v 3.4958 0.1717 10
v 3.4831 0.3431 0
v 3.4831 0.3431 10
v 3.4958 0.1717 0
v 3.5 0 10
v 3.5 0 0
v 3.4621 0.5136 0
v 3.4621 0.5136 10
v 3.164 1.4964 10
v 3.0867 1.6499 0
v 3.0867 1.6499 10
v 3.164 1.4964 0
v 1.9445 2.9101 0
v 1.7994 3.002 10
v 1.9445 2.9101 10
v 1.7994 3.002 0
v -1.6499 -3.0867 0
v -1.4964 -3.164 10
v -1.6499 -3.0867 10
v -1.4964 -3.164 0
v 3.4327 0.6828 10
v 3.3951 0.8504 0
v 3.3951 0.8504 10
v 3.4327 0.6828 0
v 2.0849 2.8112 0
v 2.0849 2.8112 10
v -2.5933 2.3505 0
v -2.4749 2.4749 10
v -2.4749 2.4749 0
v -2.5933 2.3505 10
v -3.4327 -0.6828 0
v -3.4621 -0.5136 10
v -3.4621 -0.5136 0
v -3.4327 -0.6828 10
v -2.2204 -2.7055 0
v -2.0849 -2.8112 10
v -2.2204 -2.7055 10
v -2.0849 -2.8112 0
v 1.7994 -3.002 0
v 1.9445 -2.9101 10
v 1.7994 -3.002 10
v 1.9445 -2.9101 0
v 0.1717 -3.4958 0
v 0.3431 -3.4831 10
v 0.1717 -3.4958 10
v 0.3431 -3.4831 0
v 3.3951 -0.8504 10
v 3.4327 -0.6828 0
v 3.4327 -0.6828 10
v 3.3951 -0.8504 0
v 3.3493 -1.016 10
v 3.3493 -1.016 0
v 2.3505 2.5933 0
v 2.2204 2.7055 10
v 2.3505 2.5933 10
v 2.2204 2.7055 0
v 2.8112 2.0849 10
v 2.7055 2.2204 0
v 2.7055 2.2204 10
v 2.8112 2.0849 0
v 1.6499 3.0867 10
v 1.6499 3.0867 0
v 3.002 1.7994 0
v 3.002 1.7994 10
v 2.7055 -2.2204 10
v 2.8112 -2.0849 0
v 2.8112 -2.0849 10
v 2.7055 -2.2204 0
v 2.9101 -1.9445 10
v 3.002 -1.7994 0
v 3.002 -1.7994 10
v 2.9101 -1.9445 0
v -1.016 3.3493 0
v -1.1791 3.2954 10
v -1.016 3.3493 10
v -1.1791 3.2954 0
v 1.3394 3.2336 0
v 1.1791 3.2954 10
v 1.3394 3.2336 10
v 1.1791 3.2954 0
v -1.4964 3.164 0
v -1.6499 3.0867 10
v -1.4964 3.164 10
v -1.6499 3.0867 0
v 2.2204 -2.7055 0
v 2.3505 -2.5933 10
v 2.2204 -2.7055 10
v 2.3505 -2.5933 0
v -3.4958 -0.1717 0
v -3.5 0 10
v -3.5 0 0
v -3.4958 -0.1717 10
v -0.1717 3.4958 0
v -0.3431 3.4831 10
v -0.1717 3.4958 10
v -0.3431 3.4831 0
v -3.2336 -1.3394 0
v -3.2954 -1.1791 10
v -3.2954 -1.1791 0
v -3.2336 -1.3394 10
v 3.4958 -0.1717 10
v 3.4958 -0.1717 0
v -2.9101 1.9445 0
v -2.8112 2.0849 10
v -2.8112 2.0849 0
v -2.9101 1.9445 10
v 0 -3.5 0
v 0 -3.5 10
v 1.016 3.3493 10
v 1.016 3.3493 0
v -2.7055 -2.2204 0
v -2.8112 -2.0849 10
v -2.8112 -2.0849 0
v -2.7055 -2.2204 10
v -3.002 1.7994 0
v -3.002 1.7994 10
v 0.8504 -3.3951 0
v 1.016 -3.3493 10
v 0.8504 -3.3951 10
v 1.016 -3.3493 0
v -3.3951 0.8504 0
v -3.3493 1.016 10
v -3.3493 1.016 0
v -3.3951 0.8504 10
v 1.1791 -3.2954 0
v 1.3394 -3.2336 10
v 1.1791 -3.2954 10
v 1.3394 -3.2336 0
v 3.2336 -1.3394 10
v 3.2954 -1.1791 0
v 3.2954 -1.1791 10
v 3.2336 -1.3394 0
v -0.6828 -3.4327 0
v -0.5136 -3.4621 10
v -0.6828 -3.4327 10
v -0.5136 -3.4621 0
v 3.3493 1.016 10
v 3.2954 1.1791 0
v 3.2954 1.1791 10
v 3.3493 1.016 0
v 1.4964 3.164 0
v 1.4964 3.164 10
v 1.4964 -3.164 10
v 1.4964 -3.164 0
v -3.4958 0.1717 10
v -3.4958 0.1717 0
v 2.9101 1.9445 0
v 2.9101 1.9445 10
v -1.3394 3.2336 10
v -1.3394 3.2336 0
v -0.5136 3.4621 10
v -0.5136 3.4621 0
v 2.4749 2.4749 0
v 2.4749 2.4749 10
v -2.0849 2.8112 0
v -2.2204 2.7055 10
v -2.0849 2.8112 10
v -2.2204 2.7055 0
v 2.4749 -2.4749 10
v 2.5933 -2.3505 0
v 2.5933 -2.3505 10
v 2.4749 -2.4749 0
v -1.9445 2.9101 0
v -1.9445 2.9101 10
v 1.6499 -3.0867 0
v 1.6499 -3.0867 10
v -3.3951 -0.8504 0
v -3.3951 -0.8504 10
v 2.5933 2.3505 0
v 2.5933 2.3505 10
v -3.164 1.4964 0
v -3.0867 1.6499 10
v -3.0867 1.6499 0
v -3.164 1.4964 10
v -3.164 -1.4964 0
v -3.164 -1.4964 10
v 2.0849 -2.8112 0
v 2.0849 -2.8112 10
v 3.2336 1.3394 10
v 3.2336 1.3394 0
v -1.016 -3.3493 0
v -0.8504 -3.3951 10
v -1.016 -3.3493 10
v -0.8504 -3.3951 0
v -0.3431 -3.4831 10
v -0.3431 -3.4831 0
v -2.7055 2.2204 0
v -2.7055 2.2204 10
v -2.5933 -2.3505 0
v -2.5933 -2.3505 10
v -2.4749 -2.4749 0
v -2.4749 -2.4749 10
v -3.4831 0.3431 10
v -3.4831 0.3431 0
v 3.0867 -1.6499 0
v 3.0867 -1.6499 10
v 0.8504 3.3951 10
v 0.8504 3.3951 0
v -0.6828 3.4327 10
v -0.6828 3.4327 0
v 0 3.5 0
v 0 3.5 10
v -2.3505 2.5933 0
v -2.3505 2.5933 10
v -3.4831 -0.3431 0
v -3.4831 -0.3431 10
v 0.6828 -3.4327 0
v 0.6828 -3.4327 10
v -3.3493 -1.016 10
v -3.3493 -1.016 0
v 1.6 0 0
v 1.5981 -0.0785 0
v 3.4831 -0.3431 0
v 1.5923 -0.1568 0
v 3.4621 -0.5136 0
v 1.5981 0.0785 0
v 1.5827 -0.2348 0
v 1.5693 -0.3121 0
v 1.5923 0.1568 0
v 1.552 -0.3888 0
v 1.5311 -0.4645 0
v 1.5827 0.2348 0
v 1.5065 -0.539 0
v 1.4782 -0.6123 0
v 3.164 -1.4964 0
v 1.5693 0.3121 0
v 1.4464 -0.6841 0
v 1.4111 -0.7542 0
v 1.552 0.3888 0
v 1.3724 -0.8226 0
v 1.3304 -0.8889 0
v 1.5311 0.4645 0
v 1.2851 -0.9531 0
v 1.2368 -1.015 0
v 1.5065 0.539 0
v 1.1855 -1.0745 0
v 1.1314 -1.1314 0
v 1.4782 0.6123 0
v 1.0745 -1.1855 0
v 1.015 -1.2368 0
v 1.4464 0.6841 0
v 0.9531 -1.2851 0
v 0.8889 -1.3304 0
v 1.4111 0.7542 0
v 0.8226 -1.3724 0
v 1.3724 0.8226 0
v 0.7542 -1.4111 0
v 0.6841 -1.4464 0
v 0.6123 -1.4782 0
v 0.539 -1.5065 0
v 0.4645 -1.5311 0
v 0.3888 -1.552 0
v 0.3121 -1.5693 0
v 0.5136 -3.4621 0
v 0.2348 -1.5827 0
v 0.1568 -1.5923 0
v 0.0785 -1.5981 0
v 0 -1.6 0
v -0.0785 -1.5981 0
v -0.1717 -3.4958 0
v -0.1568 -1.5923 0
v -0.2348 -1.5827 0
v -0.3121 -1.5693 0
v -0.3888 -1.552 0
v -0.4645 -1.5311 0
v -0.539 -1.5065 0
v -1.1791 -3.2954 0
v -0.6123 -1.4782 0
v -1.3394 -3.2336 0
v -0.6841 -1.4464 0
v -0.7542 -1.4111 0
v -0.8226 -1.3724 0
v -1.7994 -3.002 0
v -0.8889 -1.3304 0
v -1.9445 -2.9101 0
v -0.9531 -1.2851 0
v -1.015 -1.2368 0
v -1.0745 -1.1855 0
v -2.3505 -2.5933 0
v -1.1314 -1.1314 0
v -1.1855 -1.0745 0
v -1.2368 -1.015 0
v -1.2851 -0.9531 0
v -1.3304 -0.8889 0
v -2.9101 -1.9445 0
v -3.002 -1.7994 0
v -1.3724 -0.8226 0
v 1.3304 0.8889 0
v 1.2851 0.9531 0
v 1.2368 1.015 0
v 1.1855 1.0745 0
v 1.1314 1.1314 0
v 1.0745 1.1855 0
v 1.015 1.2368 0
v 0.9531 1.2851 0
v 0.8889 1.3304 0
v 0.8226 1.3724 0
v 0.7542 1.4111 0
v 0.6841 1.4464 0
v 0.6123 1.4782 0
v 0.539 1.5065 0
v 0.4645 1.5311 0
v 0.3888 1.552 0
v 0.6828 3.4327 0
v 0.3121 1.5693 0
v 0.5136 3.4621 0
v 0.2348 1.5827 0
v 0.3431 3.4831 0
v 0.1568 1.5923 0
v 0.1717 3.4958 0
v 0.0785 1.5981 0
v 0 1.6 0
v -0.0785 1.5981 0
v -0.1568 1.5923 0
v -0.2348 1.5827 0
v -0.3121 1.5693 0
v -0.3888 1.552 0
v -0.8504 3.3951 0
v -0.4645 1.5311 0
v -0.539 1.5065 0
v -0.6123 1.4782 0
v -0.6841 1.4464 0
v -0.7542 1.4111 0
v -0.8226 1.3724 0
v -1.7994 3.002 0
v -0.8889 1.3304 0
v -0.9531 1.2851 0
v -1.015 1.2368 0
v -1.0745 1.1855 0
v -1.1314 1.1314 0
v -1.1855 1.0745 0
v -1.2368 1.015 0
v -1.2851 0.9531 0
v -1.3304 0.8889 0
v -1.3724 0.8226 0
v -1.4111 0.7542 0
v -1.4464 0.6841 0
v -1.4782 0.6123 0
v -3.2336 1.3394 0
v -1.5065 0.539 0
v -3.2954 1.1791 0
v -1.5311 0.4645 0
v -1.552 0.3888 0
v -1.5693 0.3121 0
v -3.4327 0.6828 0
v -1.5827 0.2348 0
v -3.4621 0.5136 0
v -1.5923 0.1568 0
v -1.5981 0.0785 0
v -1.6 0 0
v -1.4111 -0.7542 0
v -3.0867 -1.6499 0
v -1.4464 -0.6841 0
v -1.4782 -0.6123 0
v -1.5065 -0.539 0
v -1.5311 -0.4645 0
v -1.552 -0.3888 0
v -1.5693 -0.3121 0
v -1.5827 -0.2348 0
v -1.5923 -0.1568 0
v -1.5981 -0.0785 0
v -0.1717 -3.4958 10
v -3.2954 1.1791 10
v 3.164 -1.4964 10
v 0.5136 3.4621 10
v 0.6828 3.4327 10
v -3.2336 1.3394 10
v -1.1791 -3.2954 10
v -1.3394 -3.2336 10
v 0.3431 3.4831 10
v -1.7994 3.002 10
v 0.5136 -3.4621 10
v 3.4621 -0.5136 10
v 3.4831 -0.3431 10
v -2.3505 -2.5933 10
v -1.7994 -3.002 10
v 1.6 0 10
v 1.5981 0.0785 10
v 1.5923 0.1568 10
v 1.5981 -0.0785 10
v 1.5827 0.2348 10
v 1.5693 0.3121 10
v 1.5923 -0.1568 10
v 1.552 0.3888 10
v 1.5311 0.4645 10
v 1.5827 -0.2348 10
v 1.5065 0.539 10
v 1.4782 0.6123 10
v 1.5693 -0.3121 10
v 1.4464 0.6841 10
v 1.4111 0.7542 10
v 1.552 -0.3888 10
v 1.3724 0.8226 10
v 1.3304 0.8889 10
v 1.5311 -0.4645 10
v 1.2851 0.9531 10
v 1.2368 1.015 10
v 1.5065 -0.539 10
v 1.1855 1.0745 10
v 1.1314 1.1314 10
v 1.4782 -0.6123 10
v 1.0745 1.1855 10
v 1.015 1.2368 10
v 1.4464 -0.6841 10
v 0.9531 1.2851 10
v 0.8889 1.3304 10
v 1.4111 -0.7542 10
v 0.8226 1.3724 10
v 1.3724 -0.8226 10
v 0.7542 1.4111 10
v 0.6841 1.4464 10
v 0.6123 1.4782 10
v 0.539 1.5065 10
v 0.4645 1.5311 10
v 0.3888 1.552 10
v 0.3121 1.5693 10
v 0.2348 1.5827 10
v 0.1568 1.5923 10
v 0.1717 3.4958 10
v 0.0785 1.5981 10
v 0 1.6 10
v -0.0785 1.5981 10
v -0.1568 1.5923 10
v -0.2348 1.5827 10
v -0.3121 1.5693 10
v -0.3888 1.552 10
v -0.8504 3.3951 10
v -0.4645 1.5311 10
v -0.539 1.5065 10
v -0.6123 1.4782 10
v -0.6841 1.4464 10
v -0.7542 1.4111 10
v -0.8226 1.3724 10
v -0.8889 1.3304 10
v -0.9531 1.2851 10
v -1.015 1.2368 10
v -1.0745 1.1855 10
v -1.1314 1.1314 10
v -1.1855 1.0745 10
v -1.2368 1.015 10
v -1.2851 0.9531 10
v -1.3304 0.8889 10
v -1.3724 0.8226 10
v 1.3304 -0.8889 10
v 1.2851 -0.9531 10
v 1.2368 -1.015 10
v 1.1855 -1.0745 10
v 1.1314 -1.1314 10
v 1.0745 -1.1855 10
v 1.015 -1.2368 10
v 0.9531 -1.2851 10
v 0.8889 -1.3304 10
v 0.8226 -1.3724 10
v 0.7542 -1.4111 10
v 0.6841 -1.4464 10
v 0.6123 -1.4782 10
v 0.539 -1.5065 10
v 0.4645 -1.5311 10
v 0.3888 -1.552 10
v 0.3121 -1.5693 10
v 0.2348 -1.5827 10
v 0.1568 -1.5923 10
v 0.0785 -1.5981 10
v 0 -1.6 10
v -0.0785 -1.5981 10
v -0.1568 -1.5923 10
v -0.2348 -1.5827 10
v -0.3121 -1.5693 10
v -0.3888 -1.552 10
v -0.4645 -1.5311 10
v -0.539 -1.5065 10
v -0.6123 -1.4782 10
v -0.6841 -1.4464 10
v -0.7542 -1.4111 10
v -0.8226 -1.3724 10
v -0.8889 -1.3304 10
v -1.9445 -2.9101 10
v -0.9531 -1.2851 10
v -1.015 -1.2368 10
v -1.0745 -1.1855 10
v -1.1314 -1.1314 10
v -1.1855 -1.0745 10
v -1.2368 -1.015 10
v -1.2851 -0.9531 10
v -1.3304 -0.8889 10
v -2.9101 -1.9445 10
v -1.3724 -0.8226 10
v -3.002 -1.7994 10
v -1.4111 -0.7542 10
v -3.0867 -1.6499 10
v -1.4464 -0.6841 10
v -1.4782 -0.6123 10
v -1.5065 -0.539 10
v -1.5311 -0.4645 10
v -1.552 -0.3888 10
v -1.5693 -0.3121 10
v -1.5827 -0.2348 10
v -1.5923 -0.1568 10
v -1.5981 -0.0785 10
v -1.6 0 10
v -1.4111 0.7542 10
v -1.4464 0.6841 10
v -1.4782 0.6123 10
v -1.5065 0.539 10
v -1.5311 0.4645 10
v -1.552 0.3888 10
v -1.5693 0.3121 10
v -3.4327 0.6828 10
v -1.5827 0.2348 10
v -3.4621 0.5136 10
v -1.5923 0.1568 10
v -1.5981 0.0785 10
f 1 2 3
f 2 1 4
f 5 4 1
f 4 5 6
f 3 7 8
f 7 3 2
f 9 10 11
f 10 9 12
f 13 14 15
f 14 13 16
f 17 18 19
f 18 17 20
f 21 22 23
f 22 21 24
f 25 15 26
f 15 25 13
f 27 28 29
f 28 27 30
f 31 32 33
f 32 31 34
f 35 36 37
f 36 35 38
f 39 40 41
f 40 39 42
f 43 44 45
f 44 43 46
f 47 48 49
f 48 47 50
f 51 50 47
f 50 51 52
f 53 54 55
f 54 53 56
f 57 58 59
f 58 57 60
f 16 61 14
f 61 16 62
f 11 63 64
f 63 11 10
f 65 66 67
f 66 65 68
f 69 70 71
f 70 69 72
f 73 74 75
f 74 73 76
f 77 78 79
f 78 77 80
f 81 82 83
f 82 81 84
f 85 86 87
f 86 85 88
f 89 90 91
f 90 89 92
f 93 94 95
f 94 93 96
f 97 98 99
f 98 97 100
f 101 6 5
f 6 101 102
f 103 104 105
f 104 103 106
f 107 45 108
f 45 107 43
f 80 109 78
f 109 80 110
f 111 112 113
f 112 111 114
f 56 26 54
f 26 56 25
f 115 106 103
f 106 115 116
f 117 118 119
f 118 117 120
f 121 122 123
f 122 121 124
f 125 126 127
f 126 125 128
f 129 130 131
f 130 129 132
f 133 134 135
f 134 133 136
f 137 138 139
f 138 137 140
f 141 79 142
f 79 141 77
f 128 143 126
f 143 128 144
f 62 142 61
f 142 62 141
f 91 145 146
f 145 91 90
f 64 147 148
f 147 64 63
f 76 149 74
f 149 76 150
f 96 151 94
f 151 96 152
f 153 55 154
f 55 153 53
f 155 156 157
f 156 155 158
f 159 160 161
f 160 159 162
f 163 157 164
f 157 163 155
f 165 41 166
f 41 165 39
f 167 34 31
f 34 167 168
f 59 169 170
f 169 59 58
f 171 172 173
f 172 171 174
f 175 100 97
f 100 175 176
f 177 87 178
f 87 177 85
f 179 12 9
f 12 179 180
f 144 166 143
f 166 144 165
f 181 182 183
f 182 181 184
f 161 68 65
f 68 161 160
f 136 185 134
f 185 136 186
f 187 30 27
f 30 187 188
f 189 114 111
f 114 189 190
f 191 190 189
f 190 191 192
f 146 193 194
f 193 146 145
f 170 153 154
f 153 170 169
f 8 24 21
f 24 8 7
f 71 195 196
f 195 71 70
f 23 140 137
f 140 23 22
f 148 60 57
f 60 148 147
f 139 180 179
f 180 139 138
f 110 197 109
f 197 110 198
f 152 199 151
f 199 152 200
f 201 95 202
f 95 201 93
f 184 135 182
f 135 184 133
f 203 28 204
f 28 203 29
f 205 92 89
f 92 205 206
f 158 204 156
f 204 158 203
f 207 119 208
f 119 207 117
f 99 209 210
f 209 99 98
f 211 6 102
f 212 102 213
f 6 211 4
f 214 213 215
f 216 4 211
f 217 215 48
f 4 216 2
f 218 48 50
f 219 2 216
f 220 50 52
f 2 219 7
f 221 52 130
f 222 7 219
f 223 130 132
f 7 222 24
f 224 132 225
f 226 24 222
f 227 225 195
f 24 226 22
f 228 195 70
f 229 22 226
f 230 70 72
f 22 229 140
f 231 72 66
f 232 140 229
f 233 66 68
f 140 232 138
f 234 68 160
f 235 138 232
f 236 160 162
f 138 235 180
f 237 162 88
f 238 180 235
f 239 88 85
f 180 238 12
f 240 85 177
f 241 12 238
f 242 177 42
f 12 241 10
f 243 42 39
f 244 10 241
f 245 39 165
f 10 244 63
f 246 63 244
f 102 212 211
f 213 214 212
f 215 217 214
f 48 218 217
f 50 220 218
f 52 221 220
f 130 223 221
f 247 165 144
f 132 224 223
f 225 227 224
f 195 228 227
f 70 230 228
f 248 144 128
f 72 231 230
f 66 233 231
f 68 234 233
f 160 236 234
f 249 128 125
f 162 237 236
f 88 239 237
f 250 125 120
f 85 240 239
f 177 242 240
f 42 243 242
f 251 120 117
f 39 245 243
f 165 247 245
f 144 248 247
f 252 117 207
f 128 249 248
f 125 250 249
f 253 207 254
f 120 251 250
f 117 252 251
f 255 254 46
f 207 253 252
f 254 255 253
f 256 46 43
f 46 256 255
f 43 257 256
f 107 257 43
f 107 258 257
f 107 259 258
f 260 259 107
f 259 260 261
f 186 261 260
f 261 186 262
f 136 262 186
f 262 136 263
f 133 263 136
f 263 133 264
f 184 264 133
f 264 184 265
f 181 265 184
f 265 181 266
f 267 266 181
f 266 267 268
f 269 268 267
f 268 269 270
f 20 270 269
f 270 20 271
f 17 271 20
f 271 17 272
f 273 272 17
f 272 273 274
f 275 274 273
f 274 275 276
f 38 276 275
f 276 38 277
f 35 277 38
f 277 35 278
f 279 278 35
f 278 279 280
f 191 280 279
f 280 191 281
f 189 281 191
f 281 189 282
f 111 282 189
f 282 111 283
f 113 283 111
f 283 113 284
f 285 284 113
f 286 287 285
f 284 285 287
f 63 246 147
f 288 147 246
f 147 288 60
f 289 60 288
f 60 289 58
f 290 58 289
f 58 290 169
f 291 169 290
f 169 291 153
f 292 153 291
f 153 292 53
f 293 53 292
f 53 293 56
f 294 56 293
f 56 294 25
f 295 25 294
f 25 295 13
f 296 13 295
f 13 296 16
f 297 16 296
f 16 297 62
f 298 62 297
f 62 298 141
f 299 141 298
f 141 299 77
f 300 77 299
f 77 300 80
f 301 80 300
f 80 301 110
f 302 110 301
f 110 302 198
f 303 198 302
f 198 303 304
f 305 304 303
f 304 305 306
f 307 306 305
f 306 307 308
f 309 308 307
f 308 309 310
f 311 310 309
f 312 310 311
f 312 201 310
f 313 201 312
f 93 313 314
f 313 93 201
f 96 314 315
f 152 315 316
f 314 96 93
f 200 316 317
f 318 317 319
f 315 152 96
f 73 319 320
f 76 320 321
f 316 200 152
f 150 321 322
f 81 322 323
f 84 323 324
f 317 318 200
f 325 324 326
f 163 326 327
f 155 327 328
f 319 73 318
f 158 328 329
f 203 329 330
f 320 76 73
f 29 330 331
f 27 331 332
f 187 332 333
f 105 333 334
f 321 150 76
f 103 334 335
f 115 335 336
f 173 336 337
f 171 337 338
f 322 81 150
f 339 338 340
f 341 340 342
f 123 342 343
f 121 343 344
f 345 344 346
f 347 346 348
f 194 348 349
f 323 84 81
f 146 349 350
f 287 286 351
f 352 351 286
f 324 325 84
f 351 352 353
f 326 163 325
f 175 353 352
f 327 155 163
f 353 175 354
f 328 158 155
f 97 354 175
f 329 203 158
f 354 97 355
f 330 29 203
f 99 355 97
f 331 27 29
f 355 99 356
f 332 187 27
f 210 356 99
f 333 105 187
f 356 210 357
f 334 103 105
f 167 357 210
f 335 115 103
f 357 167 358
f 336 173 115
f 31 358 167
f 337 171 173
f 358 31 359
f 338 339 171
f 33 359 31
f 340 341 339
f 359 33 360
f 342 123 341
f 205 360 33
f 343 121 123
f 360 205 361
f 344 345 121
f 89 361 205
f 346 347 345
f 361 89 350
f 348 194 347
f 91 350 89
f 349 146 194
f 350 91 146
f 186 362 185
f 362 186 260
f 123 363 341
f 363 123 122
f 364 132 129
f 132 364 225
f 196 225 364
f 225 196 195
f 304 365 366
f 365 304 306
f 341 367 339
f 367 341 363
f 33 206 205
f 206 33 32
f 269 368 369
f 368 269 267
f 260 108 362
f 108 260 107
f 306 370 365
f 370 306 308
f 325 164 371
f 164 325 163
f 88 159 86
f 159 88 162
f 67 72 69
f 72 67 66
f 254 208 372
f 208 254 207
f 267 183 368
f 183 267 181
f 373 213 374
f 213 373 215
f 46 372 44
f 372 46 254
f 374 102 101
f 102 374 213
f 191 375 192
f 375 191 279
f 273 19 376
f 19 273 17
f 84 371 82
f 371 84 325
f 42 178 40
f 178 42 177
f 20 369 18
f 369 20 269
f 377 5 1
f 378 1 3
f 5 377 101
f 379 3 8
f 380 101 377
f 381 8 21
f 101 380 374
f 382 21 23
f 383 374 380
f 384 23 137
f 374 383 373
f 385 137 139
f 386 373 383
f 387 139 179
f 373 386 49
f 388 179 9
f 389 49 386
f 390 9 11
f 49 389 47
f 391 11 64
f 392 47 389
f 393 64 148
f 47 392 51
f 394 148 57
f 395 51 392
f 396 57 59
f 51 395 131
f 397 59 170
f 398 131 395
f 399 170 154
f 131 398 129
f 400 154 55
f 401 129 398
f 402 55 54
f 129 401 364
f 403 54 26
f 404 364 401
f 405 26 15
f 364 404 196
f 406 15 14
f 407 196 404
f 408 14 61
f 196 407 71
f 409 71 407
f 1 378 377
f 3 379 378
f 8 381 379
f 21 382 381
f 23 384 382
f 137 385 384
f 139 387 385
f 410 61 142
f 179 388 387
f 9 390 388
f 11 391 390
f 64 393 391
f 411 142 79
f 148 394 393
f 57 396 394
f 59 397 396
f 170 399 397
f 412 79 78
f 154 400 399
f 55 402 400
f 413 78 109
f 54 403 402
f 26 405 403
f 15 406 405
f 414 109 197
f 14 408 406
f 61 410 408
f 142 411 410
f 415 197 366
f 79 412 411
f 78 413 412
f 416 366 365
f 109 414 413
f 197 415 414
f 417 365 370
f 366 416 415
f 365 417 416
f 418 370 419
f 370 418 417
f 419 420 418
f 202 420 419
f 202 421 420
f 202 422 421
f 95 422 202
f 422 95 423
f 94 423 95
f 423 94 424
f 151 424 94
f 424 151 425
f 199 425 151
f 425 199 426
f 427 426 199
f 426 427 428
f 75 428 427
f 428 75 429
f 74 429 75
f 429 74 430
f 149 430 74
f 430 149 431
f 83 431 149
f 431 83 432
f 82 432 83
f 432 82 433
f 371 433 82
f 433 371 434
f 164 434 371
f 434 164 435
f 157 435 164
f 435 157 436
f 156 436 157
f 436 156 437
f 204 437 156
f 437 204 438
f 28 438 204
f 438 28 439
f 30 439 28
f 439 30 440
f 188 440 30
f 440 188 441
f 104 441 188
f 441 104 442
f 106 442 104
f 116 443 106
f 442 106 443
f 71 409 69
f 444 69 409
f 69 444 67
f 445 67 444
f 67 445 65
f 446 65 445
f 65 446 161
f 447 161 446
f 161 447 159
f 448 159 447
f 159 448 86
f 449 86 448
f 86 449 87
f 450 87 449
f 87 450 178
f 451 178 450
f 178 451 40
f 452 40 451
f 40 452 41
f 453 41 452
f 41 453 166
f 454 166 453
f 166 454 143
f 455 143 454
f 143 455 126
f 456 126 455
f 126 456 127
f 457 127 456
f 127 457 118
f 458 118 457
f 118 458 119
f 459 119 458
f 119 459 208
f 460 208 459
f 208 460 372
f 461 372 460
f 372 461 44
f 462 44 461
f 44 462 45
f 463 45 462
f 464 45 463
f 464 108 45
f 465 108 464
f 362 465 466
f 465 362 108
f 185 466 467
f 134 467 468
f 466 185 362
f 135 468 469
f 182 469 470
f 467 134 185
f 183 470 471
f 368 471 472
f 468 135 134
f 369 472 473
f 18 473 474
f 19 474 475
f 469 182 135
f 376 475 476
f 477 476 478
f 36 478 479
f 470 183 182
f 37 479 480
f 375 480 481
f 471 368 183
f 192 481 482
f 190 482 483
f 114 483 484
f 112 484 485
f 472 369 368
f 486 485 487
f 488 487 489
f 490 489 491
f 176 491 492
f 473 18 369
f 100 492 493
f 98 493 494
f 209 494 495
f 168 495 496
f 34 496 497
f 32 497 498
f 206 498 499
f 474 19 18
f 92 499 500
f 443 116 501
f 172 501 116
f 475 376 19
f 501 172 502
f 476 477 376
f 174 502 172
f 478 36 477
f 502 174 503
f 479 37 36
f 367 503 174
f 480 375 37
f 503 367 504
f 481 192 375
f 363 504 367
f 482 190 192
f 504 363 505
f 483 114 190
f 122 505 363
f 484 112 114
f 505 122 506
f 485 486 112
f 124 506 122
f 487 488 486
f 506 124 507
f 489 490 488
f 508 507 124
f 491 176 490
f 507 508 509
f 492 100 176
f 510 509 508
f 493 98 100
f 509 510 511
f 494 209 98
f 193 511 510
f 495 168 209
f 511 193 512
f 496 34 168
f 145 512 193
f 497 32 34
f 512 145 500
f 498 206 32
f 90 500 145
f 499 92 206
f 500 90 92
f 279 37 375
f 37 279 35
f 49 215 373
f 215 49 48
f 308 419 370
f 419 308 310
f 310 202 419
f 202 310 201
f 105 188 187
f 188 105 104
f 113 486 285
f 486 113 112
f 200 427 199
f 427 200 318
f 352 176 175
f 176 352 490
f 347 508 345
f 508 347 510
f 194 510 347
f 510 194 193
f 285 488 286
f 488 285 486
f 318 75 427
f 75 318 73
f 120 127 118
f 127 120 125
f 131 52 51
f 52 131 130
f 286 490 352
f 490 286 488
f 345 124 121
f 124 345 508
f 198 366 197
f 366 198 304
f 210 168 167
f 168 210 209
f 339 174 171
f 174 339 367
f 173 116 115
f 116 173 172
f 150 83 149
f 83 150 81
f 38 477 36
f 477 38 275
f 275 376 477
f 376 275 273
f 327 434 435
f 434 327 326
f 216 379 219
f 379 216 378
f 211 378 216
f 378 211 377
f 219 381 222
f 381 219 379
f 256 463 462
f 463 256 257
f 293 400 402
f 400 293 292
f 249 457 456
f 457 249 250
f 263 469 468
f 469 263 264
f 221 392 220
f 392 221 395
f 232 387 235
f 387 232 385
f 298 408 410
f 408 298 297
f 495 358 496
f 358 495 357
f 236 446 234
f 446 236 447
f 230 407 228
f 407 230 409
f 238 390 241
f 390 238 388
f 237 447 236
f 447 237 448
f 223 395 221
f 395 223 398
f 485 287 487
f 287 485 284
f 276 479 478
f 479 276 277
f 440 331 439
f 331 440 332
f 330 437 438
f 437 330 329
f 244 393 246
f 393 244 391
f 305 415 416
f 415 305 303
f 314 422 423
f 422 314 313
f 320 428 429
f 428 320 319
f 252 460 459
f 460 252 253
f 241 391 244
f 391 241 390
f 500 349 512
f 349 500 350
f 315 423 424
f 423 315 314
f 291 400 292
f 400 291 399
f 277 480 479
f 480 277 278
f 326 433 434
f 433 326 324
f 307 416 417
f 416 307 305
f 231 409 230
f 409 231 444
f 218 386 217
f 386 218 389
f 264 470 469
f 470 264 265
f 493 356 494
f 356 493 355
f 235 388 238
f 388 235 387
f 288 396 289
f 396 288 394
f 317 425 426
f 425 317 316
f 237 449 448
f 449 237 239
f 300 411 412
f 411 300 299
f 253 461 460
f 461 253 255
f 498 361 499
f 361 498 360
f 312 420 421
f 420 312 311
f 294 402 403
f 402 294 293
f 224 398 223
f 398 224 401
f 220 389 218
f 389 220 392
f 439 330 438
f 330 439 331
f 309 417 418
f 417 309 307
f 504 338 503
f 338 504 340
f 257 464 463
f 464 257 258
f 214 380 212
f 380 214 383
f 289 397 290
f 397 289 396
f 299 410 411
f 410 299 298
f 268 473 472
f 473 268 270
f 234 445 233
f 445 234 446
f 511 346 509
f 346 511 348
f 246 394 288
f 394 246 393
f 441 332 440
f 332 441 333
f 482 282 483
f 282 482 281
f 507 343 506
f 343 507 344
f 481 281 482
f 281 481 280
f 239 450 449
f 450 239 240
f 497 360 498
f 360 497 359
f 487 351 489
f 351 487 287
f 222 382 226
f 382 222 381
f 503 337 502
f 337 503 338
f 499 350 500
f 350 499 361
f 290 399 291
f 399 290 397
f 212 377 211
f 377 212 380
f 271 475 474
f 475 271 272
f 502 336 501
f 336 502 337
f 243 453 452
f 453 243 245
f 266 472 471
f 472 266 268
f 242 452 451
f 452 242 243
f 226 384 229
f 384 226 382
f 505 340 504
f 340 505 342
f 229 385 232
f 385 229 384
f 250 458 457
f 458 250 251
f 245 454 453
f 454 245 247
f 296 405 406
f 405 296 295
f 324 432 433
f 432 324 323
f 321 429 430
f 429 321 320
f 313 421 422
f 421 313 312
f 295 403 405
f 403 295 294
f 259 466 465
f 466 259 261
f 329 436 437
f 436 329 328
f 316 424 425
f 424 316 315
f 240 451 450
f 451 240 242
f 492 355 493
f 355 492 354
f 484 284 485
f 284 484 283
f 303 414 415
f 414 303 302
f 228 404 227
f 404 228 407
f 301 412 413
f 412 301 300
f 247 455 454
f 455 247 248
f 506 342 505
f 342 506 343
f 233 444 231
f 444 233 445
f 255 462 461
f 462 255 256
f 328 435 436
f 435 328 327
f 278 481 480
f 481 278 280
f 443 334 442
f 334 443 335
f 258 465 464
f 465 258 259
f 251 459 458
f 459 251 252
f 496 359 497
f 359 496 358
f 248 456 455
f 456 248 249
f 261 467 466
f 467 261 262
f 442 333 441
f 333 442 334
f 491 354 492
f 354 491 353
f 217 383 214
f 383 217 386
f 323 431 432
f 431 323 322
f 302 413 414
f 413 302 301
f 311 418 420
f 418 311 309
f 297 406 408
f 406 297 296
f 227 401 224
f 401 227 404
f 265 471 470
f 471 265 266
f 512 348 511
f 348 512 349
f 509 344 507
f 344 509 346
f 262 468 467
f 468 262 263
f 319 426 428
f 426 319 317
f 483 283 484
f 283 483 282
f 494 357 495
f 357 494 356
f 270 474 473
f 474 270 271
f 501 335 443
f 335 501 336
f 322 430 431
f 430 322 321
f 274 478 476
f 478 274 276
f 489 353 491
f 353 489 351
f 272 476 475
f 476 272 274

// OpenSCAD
// file: ../../../lib/rounded_cube.scad
/*
  lib/rounded_cube.scad

  Simple "rounded cube" helper using minkowski sum.
  Not super performance-friendly for big parts, but handy for small stuff.
*/

module rounded_cube(size = [10, 10, 10], r = 1, center = false) {
    minkowski() {
        cube(size, center = center);
        sphere(r = r, $fn = 32);
    }
}
// main file
/*
  models/mechanical/spacer_m3/spacer_m3.scad

  Configurable M3 spacer.
*/

use <../../../lib/rounded_cube.scad>;

hole_d = 3.2;      // clearance for M3
outer_d = 7;       // outer diameter of spacer
height = 10;       // overall height
$fn = 128;         // smooth cylinders

module spacer(hole_d = 3.2, outer_d = 7, height = 10) {
    difference() {
        cylinder(d = outer_d, h = height);
        translate([0, 0, -1])
            cylinder(d = hole_d, h = height + 2);
    }
}

// Render the spacer
spacer(hole_d = hole_d, outer_d = outer_d, height = height);
